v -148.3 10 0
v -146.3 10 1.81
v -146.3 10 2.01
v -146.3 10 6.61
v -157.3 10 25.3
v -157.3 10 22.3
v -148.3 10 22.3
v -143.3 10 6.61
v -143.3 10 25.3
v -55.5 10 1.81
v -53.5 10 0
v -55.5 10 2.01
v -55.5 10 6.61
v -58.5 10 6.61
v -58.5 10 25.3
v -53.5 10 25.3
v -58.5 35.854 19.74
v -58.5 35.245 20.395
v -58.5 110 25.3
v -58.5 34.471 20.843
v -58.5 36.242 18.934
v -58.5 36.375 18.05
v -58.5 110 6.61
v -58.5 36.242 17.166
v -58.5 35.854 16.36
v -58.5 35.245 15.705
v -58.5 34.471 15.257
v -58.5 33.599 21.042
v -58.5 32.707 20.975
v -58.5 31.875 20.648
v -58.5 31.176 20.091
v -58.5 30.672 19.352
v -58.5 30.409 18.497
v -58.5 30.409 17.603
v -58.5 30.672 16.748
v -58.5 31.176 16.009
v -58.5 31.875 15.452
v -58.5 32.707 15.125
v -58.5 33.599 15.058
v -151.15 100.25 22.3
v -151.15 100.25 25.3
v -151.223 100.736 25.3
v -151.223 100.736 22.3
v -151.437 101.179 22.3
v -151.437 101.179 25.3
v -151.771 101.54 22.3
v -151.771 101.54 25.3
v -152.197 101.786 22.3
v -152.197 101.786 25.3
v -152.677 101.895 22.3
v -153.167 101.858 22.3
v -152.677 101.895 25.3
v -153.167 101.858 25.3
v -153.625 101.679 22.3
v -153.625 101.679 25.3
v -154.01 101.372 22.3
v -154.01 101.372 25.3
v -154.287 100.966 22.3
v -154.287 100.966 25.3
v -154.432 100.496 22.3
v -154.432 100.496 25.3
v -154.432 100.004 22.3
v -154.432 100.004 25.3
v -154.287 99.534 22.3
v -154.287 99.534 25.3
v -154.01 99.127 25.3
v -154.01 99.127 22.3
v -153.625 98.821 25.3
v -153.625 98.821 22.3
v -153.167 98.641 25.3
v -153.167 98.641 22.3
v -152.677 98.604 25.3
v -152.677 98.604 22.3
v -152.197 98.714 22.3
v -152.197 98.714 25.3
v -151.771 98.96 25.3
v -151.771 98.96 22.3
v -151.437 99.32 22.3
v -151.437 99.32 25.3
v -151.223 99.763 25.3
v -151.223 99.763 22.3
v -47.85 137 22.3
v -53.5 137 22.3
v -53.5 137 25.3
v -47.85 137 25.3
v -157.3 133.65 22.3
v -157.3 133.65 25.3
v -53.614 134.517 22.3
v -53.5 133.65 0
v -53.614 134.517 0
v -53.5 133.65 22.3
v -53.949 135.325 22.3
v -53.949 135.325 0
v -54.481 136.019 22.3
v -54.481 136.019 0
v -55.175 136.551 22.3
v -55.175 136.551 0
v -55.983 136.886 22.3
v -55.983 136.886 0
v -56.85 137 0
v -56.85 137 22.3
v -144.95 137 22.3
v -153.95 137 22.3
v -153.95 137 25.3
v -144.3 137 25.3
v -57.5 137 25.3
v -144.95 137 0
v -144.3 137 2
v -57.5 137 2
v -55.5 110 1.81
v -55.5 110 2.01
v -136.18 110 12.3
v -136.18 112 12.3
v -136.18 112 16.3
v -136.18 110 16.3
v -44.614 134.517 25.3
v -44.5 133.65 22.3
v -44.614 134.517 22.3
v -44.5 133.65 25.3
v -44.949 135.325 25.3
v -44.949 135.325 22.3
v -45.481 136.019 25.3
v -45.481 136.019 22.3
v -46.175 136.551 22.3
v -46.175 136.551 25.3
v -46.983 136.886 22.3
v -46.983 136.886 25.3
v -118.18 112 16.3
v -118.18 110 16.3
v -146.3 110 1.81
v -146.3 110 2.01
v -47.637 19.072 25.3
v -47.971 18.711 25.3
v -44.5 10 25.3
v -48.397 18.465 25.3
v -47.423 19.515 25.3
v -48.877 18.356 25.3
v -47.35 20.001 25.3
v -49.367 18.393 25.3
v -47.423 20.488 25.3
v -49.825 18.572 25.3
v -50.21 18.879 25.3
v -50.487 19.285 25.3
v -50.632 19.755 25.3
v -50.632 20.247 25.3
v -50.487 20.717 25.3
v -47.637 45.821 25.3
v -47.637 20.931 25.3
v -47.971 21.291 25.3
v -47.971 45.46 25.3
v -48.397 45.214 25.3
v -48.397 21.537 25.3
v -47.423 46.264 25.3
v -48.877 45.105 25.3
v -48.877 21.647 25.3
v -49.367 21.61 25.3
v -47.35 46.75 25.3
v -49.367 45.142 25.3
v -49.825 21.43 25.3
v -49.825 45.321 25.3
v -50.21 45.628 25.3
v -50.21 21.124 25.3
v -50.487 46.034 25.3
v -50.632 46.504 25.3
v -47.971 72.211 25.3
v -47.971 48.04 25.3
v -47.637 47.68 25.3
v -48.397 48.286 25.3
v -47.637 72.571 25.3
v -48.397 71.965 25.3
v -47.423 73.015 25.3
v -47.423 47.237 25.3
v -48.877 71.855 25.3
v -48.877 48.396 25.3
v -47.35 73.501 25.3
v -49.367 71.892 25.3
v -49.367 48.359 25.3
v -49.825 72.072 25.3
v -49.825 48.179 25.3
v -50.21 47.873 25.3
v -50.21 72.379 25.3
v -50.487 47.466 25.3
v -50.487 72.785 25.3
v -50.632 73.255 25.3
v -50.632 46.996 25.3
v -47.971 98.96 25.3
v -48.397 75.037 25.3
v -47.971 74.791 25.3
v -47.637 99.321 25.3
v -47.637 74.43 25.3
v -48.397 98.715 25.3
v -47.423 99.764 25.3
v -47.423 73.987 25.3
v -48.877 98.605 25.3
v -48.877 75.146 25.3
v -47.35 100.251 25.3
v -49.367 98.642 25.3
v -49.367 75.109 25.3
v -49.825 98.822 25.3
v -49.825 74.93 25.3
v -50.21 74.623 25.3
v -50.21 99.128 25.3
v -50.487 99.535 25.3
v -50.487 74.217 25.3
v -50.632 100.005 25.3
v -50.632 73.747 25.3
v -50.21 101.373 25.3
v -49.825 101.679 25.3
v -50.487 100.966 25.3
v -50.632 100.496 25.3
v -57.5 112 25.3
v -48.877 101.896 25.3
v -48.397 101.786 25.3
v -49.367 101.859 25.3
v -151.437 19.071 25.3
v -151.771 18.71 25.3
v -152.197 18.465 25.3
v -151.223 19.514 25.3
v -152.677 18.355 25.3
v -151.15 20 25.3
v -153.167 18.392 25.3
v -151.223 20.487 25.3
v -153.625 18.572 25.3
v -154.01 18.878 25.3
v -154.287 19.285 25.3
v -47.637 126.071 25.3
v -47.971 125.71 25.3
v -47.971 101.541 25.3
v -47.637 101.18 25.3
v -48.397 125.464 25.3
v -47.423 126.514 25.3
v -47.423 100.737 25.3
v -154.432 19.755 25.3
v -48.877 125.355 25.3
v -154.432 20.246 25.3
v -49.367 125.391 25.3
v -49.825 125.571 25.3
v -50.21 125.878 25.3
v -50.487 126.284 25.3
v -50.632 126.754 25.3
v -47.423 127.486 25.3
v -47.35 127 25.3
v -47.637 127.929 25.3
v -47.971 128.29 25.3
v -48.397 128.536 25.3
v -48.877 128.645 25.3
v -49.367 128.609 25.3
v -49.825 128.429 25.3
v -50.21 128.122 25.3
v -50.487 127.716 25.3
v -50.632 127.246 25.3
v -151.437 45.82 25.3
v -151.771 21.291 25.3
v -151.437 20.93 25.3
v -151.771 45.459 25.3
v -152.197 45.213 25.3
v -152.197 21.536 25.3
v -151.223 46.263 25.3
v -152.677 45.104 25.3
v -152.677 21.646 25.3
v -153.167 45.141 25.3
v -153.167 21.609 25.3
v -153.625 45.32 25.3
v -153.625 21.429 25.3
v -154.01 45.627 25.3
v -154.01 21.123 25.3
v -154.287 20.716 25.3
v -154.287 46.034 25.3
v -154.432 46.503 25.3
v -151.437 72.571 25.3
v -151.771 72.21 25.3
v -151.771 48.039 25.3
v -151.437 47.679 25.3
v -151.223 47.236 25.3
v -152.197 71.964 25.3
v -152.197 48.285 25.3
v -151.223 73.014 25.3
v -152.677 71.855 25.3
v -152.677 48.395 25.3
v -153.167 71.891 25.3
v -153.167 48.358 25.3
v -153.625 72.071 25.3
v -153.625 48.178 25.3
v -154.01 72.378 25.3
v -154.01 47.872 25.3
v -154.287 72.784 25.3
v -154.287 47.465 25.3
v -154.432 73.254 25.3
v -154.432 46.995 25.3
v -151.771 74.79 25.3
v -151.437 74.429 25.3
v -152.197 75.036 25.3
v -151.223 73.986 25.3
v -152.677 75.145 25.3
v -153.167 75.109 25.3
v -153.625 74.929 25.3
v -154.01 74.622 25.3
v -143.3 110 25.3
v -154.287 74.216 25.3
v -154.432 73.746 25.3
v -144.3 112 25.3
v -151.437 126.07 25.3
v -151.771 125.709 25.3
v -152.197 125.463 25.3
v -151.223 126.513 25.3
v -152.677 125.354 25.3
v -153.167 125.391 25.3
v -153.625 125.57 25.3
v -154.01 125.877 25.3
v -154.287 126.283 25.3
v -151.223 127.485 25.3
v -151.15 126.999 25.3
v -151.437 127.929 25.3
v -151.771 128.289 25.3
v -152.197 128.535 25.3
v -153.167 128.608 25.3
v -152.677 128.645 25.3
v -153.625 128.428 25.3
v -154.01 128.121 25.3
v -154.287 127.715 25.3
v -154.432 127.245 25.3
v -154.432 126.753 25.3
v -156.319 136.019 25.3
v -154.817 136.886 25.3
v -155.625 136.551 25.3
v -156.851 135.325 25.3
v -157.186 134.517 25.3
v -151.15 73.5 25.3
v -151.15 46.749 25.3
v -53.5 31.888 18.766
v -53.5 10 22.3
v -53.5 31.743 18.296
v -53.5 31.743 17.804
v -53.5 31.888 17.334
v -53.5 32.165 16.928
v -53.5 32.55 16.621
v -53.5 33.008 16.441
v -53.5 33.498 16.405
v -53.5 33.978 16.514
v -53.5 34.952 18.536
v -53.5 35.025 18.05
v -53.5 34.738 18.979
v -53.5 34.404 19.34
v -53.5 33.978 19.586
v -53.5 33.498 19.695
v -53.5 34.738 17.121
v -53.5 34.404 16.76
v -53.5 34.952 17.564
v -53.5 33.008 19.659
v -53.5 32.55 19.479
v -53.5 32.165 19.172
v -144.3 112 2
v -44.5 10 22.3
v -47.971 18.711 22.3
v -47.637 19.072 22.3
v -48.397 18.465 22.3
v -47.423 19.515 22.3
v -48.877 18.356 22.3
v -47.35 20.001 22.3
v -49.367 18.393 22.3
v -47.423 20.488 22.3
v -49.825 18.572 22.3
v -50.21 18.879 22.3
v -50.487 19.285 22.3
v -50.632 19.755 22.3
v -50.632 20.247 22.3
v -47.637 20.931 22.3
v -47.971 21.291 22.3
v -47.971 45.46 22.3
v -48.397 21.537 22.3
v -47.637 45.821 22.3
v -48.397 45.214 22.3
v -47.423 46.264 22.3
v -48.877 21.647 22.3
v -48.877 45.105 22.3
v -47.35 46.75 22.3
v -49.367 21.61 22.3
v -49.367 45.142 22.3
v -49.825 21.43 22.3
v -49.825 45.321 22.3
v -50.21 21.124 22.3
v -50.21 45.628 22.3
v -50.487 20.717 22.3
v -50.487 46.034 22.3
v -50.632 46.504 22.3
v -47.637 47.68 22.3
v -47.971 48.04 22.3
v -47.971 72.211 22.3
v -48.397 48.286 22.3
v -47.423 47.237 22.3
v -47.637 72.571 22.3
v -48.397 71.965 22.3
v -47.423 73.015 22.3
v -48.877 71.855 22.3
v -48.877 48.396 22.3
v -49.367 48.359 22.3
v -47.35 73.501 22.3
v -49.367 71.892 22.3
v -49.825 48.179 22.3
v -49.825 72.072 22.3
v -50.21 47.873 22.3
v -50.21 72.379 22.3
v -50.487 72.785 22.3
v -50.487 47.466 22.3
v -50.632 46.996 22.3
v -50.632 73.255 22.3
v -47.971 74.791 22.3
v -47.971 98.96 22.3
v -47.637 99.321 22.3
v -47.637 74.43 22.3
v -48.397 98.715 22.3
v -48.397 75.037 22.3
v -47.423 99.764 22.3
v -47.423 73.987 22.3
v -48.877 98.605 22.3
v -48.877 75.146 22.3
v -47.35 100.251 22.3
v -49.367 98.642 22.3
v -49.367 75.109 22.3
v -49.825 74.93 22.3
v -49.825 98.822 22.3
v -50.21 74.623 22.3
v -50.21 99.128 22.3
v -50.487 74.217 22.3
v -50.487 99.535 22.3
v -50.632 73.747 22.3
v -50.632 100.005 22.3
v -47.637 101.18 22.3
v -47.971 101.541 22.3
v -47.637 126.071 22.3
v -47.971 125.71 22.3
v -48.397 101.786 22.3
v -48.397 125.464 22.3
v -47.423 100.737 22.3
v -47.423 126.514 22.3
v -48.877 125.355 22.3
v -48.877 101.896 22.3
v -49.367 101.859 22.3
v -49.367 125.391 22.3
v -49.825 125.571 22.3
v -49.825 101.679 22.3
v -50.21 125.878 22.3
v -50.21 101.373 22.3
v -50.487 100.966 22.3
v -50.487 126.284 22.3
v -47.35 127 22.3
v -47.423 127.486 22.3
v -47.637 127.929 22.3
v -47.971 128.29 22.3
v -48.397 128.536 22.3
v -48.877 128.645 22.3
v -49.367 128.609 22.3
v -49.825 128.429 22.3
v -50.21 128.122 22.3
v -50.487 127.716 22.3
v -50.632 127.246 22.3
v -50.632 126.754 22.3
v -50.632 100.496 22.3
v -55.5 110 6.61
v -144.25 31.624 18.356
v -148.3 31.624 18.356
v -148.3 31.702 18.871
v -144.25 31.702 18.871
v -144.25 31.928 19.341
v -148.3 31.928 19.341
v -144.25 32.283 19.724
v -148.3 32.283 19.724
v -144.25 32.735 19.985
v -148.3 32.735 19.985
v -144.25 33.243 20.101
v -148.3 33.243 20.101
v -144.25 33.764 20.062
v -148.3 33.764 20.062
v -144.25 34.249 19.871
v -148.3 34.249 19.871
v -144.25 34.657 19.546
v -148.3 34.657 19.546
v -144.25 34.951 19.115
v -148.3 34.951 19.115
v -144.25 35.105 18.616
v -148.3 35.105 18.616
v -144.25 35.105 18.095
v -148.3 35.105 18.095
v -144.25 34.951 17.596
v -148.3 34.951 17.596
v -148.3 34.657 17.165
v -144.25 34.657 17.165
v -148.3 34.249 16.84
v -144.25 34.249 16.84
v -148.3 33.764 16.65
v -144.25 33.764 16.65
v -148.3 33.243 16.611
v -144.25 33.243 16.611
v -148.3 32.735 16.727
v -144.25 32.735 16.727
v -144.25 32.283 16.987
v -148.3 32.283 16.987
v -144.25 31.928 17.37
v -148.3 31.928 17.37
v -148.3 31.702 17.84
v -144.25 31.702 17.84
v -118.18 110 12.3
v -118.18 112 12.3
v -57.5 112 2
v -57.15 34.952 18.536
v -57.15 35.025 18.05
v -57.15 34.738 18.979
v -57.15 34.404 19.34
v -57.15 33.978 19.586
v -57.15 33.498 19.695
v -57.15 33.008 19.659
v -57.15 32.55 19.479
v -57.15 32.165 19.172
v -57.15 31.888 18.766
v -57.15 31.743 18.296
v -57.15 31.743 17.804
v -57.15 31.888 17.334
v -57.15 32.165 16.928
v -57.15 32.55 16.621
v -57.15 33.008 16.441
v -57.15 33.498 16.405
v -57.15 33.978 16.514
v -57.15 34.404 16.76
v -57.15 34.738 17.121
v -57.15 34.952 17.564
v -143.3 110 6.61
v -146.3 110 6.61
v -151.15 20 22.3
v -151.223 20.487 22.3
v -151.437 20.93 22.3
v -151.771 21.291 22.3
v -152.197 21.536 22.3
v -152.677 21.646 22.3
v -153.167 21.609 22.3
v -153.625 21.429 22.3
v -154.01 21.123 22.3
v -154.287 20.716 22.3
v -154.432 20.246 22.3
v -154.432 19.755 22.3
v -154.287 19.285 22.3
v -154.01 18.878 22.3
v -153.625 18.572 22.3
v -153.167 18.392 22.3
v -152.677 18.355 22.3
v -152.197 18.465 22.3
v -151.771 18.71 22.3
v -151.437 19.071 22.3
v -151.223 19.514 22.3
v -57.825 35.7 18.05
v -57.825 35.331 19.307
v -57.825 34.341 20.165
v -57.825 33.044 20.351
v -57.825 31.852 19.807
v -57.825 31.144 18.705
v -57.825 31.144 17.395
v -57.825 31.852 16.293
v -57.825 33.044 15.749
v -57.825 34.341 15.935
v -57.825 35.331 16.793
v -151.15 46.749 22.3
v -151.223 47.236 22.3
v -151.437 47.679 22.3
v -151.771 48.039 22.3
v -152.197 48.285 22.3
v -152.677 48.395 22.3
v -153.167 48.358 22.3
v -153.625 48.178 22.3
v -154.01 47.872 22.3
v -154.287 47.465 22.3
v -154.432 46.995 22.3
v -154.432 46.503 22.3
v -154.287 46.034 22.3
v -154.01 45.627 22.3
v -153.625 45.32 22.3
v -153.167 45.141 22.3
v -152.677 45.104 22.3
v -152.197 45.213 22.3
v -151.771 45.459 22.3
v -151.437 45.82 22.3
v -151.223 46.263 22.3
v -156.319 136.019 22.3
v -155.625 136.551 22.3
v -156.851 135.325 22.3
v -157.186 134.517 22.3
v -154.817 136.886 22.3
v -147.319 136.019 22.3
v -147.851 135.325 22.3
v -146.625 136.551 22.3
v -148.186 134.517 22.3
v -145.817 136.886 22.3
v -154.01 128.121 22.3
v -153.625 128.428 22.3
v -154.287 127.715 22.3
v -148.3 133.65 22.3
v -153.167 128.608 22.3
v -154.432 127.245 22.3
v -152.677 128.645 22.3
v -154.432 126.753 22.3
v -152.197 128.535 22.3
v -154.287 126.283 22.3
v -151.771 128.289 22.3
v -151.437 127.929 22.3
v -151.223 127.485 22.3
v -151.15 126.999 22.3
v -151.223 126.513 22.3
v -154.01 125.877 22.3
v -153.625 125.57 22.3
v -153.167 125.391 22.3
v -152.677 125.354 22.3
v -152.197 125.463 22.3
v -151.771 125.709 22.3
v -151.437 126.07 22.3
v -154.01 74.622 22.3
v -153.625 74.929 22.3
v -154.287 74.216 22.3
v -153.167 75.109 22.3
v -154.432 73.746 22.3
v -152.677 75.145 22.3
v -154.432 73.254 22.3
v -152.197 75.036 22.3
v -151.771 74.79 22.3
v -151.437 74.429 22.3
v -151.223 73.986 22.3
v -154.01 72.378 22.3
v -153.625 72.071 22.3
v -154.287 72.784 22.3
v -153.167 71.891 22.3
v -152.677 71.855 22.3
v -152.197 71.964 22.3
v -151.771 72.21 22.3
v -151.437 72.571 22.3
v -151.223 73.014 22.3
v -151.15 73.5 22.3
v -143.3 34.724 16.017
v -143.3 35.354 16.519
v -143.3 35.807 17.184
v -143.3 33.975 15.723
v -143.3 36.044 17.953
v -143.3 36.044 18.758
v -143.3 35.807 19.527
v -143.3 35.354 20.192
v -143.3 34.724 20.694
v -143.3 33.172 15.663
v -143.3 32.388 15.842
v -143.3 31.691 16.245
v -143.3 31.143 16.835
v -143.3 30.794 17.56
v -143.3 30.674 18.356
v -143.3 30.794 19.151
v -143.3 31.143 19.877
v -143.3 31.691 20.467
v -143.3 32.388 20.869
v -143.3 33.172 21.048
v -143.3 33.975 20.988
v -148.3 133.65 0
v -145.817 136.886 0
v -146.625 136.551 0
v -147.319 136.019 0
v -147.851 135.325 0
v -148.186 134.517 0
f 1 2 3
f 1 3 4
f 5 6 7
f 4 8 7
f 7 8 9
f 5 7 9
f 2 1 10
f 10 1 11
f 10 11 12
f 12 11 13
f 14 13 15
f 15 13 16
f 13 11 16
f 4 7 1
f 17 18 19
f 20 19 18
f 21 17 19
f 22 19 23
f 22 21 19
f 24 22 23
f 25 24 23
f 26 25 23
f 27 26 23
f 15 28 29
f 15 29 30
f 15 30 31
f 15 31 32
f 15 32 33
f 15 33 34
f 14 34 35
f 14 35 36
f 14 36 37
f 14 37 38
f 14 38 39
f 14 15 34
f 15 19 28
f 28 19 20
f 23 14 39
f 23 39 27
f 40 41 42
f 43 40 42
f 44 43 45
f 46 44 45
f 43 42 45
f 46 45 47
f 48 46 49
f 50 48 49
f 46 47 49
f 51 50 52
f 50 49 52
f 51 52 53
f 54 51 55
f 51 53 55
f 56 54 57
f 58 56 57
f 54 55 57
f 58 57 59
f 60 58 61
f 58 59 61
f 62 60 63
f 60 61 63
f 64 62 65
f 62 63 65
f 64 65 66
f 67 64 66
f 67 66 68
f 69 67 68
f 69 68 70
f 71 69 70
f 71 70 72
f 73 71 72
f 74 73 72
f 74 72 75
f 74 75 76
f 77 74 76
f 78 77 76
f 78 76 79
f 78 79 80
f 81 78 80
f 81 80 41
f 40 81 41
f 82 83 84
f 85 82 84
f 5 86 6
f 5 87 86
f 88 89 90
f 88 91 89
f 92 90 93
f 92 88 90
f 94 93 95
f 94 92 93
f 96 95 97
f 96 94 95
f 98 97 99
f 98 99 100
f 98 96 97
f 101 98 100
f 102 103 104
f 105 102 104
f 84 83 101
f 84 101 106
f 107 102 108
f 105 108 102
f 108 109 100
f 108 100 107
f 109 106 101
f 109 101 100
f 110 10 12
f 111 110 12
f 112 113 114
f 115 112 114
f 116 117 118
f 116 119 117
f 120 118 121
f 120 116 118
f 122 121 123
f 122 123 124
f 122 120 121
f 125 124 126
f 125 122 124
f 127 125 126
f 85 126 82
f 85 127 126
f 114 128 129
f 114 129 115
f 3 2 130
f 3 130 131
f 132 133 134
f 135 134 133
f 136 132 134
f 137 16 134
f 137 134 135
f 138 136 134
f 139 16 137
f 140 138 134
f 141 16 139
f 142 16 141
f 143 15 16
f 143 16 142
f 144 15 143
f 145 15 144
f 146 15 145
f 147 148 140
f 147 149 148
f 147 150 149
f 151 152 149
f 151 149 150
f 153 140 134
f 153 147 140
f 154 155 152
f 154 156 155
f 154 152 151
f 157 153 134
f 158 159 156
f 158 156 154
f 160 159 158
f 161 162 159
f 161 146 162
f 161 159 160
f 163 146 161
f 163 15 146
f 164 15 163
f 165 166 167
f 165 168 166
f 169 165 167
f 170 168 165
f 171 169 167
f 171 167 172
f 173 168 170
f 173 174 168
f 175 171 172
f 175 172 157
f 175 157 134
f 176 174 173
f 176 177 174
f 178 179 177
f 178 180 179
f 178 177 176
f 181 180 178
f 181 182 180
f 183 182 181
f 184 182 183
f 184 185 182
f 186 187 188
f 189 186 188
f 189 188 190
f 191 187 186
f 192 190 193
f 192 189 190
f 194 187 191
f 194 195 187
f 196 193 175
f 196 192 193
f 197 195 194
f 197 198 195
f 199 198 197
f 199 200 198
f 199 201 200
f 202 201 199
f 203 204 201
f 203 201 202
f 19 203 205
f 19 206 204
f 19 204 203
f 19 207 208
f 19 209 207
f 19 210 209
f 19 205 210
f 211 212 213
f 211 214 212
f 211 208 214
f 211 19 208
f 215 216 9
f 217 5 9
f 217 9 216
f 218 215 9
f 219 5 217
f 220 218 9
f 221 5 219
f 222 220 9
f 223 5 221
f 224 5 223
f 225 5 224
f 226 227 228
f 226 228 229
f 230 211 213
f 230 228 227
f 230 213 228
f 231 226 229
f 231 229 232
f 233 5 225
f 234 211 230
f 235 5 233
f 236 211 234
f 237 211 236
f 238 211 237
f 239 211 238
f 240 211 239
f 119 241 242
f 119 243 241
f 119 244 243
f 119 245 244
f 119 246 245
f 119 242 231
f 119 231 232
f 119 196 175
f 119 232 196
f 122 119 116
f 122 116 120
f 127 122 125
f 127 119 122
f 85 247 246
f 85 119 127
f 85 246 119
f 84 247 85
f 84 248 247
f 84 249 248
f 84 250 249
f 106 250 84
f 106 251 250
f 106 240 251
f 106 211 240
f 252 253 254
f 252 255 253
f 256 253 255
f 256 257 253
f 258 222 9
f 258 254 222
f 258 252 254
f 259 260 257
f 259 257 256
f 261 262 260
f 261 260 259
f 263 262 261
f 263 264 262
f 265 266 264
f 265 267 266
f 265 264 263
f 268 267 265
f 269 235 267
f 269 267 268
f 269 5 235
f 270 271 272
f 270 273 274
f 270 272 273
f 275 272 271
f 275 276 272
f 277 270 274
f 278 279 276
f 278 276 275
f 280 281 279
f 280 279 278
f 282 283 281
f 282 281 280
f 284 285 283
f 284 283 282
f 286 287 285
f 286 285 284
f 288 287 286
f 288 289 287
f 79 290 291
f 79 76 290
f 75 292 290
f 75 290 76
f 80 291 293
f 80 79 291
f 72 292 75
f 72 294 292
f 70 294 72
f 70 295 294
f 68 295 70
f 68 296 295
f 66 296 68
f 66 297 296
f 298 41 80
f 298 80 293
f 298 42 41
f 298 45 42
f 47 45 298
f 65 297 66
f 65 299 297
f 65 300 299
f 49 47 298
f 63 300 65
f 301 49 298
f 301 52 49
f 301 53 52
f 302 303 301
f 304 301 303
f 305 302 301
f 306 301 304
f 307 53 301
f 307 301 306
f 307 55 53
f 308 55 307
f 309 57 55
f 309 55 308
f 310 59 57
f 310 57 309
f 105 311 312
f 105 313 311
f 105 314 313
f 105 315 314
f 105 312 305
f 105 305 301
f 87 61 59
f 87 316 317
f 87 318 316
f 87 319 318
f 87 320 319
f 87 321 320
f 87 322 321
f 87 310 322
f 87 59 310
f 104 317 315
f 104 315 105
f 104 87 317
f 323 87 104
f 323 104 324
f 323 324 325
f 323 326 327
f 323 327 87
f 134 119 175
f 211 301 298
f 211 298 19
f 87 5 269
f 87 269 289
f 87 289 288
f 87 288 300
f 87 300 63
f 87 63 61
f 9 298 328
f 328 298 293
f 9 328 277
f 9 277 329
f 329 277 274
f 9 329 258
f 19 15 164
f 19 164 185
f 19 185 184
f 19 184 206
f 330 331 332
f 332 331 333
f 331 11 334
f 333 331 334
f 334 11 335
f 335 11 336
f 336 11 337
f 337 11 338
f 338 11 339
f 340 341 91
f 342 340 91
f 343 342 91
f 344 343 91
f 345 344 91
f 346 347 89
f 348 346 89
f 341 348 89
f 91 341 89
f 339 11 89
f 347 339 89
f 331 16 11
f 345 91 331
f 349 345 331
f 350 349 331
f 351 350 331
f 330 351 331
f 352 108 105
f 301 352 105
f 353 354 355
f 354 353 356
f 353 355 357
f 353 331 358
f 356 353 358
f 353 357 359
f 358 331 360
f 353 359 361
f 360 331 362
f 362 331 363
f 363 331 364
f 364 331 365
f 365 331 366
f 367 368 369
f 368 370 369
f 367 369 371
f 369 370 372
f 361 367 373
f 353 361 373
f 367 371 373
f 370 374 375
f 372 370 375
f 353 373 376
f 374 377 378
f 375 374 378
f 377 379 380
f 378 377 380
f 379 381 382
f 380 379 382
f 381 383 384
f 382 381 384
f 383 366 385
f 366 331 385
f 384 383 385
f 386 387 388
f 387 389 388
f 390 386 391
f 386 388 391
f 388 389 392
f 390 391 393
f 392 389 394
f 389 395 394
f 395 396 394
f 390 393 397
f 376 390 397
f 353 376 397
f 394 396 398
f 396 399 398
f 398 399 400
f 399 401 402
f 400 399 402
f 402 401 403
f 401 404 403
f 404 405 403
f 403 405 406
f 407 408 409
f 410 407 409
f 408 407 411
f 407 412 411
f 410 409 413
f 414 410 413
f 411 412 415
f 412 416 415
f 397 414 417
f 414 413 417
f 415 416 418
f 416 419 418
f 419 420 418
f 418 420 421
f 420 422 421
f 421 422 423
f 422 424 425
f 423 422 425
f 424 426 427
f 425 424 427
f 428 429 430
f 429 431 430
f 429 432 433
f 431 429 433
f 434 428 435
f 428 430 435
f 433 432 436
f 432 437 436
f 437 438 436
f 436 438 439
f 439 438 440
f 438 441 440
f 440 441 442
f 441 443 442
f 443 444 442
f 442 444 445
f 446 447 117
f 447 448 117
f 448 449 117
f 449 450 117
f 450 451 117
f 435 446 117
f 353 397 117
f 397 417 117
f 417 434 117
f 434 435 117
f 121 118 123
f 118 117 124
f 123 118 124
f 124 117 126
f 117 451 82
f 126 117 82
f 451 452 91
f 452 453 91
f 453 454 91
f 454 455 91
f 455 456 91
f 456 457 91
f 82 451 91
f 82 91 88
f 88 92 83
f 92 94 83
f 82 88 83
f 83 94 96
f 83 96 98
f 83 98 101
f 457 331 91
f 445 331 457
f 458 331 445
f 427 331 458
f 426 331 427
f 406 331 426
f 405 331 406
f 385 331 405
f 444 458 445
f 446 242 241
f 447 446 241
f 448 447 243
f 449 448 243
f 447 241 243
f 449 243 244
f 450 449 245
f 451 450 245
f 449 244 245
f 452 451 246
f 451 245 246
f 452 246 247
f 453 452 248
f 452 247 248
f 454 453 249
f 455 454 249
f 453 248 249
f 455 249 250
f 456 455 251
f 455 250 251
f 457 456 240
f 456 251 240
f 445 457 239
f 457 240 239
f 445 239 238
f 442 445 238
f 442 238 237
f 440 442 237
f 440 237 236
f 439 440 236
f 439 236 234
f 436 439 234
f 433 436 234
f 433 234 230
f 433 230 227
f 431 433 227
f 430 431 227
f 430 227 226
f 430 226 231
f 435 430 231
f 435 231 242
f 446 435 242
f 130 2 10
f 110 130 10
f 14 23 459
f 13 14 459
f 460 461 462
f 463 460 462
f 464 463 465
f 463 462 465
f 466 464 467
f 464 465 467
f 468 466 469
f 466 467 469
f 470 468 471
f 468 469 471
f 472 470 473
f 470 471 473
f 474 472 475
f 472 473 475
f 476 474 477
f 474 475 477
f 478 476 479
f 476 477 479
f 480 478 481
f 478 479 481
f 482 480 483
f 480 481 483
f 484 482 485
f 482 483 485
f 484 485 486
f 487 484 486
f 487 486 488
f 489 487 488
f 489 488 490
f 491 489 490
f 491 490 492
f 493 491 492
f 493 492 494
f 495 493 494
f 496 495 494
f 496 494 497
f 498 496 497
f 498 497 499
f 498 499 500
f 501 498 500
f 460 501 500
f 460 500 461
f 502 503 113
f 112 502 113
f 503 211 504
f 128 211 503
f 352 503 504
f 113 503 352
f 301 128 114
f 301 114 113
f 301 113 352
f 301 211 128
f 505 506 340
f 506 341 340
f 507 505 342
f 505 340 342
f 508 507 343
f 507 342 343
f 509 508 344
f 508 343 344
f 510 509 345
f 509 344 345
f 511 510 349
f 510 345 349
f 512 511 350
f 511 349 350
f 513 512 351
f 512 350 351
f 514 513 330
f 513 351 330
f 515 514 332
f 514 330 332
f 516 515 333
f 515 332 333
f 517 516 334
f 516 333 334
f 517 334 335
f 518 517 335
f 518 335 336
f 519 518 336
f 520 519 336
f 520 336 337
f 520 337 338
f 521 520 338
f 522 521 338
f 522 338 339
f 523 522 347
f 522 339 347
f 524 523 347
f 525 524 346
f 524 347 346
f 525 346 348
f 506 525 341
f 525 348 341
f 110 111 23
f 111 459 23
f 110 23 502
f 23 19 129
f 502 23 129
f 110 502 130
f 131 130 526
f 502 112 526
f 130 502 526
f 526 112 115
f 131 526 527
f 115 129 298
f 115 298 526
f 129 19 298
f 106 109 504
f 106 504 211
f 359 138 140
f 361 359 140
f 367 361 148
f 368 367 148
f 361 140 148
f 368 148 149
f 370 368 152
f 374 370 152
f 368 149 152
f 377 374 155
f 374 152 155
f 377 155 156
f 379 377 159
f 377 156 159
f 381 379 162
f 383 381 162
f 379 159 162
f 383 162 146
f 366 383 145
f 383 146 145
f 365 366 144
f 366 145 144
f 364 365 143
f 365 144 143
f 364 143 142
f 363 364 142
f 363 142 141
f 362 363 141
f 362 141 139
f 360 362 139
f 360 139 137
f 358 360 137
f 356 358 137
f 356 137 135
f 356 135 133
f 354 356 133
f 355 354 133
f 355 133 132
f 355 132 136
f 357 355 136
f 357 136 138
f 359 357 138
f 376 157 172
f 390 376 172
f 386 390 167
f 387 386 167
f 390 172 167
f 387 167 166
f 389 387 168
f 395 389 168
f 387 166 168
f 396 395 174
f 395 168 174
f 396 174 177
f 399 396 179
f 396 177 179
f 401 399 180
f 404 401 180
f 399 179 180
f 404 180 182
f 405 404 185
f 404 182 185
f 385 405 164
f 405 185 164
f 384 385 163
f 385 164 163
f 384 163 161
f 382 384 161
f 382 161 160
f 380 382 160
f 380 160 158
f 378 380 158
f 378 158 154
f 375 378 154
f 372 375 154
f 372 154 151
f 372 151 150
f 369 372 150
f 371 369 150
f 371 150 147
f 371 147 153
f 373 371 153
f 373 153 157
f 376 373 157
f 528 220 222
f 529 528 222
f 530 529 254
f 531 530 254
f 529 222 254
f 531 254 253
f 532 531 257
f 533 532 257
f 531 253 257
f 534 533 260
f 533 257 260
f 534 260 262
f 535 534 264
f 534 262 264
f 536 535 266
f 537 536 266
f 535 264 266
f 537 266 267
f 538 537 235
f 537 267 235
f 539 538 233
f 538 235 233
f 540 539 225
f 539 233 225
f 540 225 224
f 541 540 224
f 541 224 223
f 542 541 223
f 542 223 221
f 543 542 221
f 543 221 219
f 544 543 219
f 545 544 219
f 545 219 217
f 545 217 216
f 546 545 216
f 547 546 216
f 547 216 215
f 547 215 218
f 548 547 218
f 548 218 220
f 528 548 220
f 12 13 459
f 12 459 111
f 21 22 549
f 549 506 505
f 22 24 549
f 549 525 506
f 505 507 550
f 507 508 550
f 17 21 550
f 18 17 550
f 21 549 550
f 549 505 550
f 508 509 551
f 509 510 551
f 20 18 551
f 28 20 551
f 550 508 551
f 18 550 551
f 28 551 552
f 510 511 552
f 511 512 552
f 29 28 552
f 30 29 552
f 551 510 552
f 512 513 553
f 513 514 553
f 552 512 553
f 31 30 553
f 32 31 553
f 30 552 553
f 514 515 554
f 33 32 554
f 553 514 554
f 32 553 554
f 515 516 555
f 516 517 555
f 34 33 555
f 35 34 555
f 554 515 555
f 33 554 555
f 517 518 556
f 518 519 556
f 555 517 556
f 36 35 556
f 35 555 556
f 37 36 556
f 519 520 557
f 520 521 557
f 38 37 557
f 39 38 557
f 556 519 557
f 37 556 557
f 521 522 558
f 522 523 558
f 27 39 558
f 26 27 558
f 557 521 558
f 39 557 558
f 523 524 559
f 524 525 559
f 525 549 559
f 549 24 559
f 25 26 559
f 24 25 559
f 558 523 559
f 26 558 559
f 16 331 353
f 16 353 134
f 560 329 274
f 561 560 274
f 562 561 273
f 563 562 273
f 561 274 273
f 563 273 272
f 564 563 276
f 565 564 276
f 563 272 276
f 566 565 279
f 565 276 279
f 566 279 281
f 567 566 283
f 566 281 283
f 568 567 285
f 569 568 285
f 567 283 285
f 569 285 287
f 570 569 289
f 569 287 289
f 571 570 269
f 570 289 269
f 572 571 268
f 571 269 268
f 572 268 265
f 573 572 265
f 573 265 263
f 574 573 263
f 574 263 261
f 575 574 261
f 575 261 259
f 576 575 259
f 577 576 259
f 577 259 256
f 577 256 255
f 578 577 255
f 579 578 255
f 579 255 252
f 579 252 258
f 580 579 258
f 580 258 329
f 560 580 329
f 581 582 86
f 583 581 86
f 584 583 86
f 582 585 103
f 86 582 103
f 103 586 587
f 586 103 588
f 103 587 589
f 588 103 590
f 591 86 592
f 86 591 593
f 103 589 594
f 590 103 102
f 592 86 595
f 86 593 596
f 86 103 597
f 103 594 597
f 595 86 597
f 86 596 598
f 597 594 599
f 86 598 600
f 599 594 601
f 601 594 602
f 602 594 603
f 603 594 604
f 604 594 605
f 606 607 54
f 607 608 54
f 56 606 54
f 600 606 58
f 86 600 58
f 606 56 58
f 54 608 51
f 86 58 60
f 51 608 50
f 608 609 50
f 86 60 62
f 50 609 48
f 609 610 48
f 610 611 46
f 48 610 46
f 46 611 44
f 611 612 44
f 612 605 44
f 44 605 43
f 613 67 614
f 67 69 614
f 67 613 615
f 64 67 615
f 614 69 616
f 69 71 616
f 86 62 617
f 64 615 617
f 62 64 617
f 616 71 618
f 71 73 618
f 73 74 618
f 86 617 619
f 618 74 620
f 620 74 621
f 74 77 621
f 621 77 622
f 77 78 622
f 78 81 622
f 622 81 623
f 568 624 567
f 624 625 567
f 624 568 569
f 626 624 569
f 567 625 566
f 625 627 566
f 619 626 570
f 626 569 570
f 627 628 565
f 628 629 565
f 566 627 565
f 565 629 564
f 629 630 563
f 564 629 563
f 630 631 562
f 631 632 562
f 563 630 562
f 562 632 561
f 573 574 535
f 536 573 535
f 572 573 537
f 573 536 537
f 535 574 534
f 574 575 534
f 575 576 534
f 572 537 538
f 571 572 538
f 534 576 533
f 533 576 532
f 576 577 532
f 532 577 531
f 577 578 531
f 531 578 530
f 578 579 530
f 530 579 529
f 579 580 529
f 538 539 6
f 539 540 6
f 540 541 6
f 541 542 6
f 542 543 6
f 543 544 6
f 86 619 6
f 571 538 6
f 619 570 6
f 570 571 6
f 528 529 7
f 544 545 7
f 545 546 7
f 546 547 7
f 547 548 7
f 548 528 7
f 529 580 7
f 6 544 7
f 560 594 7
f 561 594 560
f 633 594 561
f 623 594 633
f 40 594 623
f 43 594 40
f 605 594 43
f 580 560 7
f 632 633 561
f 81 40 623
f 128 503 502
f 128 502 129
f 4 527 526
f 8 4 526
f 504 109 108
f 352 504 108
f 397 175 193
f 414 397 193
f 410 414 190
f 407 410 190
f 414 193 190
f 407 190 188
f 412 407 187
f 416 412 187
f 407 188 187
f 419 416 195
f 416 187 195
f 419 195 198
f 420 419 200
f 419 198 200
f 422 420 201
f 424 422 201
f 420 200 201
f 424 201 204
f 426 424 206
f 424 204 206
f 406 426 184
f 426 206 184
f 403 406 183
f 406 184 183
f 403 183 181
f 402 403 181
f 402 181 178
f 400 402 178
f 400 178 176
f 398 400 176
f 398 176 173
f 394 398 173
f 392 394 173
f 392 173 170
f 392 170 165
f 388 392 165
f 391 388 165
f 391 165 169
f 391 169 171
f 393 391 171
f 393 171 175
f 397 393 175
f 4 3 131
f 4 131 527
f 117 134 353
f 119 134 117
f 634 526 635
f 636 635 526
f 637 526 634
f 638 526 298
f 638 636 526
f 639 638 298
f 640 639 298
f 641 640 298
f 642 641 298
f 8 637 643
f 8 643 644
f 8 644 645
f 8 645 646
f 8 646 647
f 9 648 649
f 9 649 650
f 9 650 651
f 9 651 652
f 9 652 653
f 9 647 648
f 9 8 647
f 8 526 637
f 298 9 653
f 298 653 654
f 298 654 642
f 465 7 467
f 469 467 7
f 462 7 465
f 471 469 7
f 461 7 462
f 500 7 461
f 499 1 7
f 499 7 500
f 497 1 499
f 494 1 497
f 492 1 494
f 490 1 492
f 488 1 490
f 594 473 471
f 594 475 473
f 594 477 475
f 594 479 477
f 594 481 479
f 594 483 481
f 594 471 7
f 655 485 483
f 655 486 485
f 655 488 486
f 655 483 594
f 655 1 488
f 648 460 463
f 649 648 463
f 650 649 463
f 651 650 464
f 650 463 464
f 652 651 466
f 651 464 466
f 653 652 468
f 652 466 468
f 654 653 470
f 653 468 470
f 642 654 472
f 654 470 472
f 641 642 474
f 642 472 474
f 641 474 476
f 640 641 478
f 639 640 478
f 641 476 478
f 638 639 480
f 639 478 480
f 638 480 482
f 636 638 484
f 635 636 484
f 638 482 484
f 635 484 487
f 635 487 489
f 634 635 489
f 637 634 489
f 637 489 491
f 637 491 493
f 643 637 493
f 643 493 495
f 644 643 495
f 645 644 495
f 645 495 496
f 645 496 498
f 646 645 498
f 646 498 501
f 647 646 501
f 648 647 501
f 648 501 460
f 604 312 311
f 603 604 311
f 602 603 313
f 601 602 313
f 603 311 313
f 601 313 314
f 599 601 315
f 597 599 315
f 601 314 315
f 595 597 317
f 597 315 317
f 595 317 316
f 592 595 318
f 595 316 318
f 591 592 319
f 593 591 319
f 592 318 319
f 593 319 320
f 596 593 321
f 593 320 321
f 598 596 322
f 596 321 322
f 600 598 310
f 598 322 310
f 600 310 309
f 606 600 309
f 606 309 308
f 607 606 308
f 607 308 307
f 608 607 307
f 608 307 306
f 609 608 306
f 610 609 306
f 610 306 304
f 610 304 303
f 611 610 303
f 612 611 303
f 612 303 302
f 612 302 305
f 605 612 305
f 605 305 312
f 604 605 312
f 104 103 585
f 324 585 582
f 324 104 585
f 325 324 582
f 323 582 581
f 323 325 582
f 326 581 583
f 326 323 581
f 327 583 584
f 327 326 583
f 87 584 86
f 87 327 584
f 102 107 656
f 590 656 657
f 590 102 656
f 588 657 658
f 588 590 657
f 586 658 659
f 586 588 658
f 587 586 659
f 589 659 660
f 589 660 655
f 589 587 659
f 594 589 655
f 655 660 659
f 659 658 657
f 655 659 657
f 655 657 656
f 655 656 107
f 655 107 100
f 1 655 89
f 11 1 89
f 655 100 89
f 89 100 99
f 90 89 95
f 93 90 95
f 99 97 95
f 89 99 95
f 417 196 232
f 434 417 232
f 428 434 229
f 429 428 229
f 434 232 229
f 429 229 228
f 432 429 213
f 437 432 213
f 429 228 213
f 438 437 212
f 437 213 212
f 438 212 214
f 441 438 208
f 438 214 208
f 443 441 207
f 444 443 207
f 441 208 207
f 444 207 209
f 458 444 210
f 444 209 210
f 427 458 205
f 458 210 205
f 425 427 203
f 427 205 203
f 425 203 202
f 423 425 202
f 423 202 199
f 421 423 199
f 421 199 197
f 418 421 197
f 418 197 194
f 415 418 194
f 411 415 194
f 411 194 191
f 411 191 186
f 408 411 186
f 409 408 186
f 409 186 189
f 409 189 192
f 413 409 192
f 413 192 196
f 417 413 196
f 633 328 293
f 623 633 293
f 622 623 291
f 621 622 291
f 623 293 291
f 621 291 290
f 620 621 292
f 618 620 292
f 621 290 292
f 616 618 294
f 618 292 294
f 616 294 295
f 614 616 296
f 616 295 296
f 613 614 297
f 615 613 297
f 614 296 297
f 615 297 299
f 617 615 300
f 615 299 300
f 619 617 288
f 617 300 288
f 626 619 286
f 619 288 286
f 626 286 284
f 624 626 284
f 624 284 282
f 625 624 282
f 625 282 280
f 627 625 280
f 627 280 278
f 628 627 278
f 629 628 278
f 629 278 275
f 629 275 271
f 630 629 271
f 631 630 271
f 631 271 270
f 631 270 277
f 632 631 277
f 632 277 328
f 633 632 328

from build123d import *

# Parameters (mm, degrees)
SKETCH062_W         = 94.8
SKETCH062_H         = 127
PAD_DEPTH           = 28.5
POCKET011_DEPTH     = 100
SKETCH064_W         = 86.8
SKETCH064_H         = 23.38
POCKET012_DEPTH     = 25
SKETCH065_W         = 96.8
SKETCH065_H         = 129
POCKET013_DEPTH     = 3.2
SKETCH066_W         = 127
SKETCH066_H         = 3
PAD001_DEPTH        = 9
SKETCH067_W         = 127
SKETCH067_H         = 3
PAD002_DEPTH        = 9
SKETCH069_R         = 1.65
POCKET014_DEPTH     = 5
SKETCH072_W         = 90.8
SKETCH072_H         = 0.2
POCKET015_DEPTH     = 100
HOLE016_D           = 3.3
HOLE016_DEPTH       = 5
HOLE016_CSINK_D     = 6
HOLE016_CSINK_ANGLE = 90
HOLE017_D           = 3.5
HOLE017_DEPTH       = 5.3
HOLE017_CSINK_D     = 6
HOLE017_CSINK_ANGLE = 90
FILLET_R            = 3.35
FILLET002_R         = 3.35
SKETCH076_W         = 18
SKETCH076_H         = 4
POCKET017_DEPTH     = 2


with BuildPart() as part:
    # Sketch062 → Pad (new body)
    with BuildSketch(Plane.XY):
        with Locations((42.1, 73.5)):
            Rectangle(SKETCH062_W, SKETCH062_H)
    extrude(amount=PAD_DEPTH)

    # Sketch063 (on Face1 of Pad) → Pocket011 (cut)
    with BuildSketch(Plane.XZ.offset(-10)):
        Polygon((-3.299998, 2.01), (-3.299998, 6.61), (-0.299998, 6.61), (-0.299998, 25.39), (84.500002, 25.39), (84.500002, 6.61), (87.500002, 6.61), (87.500002, 2.01), align=None)
    extrude(amount=-POCKET011_DEPTH, mode=Mode.SUBTRACT)

    # Sketch064 (on Face14 of Pocket011) → Pocket012 (cut)
    with BuildSketch(Plane(origin=(0, 137, 0), x_dir=(-1, 0, 0), z_dir=(0, 1, 0))):
        with Locations((-42.1, 13.689999)):
            Rectangle(SKETCH064_W, SKETCH064_H)
    extrude(amount=-POCKET012_DEPTH, mode=Mode.SUBTRACT)

    # Sketch065 (on Face4 of Pocket012) → Pocket013 (cut)
    with BuildSketch(Plane.XY.offset(28.5)):
        with Locations((42.180762, 73.419241)):
            Rectangle(SKETCH065_W, SKETCH065_H)
    extrude(amount=-POCKET013_DEPTH, mode=Mode.SUBTRACT)

    # Sketch066 (on Face12 of Pocket013) → Pad001 (join)
    with BuildSketch(Plane(origin=(-5.3, 0, 0), x_dir=(0, -1, 0), z_dir=(-1, 0, 0))):
        with Locations((-73.5, 23.8)):
            Rectangle(SKETCH066_W, SKETCH066_H)
    extrude(amount=PAD001_DEPTH)

    # Sketch067 (on Face3 of Pad001) → Pad002 (join)
    with BuildSketch(Plane.YZ.offset(89.5)):
        with Locations((73.500002, 23.8)):
            Rectangle(SKETCH067_W, SKETCH067_H)
    extrude(amount=PAD002_DEPTH)

    # Sketch069 (on Face17 of Pad002) → Pocket014 (cut)
    with BuildSketch(Plane.XY.offset(25.3)):
        with Locations((-9.8, 20.000492)):
            Circle(SKETCH069_R)
        with Locations((-9.8, 46.749416)):
            Circle(SKETCH069_R)
        with Locations((-9.8, 73.500001)):
            Circle(SKETCH069_R)
        with Locations((-9.8, 100.249657)):
            Circle(SKETCH069_R)
        with Locations((-9.8, 126.999153)):
            Circle(SKETCH069_R)
        with Locations((94, 20.001339)):
            Circle(SKETCH069_R)
        with Locations((94, 46.750263)):
            Circle(SKETCH069_R)
        with Locations((94, 73.500848)):
            Circle(SKETCH069_R)
        with Locations((94, 100.250504)):
            Circle(SKETCH069_R)
        with Locations((94, 127)):
            Circle(SKETCH069_R)
    extrude(amount=-POCKET014_DEPTH, mode=Mode.SUBTRACT)

    # Sketch072 (on Face1 of Pocket014) → Pocket015 (cut)
    with BuildSketch(Plane.XZ.offset(-10)):
        with Locations((42.099998, 1.91)):
            Rectangle(SKETCH072_W, SKETCH072_H)
    extrude(amount=-POCKET015_DEPTH, mode=Mode.SUBTRACT)

    # Hole016
    with Locations(Plane(origin=(84.500002, 0, 0), x_dir=(0, -1, 0), z_dir=(-1, 0, 0))):
        with Locations((-33.375, 18.05)):
            CounterSinkHole(HOLE016_D / 2, HOLE016_CSINK_D / 2, depth=HOLE016_DEPTH, counter_sink_angle=HOLE016_CSINK_ANGLE)

    # Hole017
    with Locations(Plane.YZ):
        with Locations((33.374271, 18.355644)):
            CounterSinkHole(HOLE017_D / 2, HOLE017_CSINK_D / 2, depth=HOLE017_DEPTH, counter_sink_angle=HOLE017_CSINK_ANGLE)

    # Fillet
    fillet_edges = [part.edges().sort_by_distance(p)[0] for p in [
        (98.5, 137.000002, 23.8),
        (-14.3, 137, 23.8),
    ]]
    fillet(fillet_edges, radius=FILLET_R)

    # Fillet002
    fillet002_edges = [part.edges().sort_by_distance(p)[0] for p in [
        (89.5, 137, 11.15),
        (-5.3, 137, 11.15),
    ]]
    fillet(fillet002_edges, radius=FILLET002_R)

    # Sketch076 (on Face40 of Fillet002) → Pocket017 (cut)
    with BuildSketch(Plane(origin=(0, 112, 0), x_dir=(-1, 0, 0), z_dir=(0, 1, 0))):
        with Locations((-15.819999, 14.3)):
            Rectangle(SKETCH076_W, SKETCH076_H)
    extrude(amount=-POCKET017_DEPTH, mode=Mode.SUBTRACT)


with BuildPart() as part_1:
    # Body008 placement: moved
    add(part.part.moved(Location((-143, 0, 0))))


solid = part_1.part
